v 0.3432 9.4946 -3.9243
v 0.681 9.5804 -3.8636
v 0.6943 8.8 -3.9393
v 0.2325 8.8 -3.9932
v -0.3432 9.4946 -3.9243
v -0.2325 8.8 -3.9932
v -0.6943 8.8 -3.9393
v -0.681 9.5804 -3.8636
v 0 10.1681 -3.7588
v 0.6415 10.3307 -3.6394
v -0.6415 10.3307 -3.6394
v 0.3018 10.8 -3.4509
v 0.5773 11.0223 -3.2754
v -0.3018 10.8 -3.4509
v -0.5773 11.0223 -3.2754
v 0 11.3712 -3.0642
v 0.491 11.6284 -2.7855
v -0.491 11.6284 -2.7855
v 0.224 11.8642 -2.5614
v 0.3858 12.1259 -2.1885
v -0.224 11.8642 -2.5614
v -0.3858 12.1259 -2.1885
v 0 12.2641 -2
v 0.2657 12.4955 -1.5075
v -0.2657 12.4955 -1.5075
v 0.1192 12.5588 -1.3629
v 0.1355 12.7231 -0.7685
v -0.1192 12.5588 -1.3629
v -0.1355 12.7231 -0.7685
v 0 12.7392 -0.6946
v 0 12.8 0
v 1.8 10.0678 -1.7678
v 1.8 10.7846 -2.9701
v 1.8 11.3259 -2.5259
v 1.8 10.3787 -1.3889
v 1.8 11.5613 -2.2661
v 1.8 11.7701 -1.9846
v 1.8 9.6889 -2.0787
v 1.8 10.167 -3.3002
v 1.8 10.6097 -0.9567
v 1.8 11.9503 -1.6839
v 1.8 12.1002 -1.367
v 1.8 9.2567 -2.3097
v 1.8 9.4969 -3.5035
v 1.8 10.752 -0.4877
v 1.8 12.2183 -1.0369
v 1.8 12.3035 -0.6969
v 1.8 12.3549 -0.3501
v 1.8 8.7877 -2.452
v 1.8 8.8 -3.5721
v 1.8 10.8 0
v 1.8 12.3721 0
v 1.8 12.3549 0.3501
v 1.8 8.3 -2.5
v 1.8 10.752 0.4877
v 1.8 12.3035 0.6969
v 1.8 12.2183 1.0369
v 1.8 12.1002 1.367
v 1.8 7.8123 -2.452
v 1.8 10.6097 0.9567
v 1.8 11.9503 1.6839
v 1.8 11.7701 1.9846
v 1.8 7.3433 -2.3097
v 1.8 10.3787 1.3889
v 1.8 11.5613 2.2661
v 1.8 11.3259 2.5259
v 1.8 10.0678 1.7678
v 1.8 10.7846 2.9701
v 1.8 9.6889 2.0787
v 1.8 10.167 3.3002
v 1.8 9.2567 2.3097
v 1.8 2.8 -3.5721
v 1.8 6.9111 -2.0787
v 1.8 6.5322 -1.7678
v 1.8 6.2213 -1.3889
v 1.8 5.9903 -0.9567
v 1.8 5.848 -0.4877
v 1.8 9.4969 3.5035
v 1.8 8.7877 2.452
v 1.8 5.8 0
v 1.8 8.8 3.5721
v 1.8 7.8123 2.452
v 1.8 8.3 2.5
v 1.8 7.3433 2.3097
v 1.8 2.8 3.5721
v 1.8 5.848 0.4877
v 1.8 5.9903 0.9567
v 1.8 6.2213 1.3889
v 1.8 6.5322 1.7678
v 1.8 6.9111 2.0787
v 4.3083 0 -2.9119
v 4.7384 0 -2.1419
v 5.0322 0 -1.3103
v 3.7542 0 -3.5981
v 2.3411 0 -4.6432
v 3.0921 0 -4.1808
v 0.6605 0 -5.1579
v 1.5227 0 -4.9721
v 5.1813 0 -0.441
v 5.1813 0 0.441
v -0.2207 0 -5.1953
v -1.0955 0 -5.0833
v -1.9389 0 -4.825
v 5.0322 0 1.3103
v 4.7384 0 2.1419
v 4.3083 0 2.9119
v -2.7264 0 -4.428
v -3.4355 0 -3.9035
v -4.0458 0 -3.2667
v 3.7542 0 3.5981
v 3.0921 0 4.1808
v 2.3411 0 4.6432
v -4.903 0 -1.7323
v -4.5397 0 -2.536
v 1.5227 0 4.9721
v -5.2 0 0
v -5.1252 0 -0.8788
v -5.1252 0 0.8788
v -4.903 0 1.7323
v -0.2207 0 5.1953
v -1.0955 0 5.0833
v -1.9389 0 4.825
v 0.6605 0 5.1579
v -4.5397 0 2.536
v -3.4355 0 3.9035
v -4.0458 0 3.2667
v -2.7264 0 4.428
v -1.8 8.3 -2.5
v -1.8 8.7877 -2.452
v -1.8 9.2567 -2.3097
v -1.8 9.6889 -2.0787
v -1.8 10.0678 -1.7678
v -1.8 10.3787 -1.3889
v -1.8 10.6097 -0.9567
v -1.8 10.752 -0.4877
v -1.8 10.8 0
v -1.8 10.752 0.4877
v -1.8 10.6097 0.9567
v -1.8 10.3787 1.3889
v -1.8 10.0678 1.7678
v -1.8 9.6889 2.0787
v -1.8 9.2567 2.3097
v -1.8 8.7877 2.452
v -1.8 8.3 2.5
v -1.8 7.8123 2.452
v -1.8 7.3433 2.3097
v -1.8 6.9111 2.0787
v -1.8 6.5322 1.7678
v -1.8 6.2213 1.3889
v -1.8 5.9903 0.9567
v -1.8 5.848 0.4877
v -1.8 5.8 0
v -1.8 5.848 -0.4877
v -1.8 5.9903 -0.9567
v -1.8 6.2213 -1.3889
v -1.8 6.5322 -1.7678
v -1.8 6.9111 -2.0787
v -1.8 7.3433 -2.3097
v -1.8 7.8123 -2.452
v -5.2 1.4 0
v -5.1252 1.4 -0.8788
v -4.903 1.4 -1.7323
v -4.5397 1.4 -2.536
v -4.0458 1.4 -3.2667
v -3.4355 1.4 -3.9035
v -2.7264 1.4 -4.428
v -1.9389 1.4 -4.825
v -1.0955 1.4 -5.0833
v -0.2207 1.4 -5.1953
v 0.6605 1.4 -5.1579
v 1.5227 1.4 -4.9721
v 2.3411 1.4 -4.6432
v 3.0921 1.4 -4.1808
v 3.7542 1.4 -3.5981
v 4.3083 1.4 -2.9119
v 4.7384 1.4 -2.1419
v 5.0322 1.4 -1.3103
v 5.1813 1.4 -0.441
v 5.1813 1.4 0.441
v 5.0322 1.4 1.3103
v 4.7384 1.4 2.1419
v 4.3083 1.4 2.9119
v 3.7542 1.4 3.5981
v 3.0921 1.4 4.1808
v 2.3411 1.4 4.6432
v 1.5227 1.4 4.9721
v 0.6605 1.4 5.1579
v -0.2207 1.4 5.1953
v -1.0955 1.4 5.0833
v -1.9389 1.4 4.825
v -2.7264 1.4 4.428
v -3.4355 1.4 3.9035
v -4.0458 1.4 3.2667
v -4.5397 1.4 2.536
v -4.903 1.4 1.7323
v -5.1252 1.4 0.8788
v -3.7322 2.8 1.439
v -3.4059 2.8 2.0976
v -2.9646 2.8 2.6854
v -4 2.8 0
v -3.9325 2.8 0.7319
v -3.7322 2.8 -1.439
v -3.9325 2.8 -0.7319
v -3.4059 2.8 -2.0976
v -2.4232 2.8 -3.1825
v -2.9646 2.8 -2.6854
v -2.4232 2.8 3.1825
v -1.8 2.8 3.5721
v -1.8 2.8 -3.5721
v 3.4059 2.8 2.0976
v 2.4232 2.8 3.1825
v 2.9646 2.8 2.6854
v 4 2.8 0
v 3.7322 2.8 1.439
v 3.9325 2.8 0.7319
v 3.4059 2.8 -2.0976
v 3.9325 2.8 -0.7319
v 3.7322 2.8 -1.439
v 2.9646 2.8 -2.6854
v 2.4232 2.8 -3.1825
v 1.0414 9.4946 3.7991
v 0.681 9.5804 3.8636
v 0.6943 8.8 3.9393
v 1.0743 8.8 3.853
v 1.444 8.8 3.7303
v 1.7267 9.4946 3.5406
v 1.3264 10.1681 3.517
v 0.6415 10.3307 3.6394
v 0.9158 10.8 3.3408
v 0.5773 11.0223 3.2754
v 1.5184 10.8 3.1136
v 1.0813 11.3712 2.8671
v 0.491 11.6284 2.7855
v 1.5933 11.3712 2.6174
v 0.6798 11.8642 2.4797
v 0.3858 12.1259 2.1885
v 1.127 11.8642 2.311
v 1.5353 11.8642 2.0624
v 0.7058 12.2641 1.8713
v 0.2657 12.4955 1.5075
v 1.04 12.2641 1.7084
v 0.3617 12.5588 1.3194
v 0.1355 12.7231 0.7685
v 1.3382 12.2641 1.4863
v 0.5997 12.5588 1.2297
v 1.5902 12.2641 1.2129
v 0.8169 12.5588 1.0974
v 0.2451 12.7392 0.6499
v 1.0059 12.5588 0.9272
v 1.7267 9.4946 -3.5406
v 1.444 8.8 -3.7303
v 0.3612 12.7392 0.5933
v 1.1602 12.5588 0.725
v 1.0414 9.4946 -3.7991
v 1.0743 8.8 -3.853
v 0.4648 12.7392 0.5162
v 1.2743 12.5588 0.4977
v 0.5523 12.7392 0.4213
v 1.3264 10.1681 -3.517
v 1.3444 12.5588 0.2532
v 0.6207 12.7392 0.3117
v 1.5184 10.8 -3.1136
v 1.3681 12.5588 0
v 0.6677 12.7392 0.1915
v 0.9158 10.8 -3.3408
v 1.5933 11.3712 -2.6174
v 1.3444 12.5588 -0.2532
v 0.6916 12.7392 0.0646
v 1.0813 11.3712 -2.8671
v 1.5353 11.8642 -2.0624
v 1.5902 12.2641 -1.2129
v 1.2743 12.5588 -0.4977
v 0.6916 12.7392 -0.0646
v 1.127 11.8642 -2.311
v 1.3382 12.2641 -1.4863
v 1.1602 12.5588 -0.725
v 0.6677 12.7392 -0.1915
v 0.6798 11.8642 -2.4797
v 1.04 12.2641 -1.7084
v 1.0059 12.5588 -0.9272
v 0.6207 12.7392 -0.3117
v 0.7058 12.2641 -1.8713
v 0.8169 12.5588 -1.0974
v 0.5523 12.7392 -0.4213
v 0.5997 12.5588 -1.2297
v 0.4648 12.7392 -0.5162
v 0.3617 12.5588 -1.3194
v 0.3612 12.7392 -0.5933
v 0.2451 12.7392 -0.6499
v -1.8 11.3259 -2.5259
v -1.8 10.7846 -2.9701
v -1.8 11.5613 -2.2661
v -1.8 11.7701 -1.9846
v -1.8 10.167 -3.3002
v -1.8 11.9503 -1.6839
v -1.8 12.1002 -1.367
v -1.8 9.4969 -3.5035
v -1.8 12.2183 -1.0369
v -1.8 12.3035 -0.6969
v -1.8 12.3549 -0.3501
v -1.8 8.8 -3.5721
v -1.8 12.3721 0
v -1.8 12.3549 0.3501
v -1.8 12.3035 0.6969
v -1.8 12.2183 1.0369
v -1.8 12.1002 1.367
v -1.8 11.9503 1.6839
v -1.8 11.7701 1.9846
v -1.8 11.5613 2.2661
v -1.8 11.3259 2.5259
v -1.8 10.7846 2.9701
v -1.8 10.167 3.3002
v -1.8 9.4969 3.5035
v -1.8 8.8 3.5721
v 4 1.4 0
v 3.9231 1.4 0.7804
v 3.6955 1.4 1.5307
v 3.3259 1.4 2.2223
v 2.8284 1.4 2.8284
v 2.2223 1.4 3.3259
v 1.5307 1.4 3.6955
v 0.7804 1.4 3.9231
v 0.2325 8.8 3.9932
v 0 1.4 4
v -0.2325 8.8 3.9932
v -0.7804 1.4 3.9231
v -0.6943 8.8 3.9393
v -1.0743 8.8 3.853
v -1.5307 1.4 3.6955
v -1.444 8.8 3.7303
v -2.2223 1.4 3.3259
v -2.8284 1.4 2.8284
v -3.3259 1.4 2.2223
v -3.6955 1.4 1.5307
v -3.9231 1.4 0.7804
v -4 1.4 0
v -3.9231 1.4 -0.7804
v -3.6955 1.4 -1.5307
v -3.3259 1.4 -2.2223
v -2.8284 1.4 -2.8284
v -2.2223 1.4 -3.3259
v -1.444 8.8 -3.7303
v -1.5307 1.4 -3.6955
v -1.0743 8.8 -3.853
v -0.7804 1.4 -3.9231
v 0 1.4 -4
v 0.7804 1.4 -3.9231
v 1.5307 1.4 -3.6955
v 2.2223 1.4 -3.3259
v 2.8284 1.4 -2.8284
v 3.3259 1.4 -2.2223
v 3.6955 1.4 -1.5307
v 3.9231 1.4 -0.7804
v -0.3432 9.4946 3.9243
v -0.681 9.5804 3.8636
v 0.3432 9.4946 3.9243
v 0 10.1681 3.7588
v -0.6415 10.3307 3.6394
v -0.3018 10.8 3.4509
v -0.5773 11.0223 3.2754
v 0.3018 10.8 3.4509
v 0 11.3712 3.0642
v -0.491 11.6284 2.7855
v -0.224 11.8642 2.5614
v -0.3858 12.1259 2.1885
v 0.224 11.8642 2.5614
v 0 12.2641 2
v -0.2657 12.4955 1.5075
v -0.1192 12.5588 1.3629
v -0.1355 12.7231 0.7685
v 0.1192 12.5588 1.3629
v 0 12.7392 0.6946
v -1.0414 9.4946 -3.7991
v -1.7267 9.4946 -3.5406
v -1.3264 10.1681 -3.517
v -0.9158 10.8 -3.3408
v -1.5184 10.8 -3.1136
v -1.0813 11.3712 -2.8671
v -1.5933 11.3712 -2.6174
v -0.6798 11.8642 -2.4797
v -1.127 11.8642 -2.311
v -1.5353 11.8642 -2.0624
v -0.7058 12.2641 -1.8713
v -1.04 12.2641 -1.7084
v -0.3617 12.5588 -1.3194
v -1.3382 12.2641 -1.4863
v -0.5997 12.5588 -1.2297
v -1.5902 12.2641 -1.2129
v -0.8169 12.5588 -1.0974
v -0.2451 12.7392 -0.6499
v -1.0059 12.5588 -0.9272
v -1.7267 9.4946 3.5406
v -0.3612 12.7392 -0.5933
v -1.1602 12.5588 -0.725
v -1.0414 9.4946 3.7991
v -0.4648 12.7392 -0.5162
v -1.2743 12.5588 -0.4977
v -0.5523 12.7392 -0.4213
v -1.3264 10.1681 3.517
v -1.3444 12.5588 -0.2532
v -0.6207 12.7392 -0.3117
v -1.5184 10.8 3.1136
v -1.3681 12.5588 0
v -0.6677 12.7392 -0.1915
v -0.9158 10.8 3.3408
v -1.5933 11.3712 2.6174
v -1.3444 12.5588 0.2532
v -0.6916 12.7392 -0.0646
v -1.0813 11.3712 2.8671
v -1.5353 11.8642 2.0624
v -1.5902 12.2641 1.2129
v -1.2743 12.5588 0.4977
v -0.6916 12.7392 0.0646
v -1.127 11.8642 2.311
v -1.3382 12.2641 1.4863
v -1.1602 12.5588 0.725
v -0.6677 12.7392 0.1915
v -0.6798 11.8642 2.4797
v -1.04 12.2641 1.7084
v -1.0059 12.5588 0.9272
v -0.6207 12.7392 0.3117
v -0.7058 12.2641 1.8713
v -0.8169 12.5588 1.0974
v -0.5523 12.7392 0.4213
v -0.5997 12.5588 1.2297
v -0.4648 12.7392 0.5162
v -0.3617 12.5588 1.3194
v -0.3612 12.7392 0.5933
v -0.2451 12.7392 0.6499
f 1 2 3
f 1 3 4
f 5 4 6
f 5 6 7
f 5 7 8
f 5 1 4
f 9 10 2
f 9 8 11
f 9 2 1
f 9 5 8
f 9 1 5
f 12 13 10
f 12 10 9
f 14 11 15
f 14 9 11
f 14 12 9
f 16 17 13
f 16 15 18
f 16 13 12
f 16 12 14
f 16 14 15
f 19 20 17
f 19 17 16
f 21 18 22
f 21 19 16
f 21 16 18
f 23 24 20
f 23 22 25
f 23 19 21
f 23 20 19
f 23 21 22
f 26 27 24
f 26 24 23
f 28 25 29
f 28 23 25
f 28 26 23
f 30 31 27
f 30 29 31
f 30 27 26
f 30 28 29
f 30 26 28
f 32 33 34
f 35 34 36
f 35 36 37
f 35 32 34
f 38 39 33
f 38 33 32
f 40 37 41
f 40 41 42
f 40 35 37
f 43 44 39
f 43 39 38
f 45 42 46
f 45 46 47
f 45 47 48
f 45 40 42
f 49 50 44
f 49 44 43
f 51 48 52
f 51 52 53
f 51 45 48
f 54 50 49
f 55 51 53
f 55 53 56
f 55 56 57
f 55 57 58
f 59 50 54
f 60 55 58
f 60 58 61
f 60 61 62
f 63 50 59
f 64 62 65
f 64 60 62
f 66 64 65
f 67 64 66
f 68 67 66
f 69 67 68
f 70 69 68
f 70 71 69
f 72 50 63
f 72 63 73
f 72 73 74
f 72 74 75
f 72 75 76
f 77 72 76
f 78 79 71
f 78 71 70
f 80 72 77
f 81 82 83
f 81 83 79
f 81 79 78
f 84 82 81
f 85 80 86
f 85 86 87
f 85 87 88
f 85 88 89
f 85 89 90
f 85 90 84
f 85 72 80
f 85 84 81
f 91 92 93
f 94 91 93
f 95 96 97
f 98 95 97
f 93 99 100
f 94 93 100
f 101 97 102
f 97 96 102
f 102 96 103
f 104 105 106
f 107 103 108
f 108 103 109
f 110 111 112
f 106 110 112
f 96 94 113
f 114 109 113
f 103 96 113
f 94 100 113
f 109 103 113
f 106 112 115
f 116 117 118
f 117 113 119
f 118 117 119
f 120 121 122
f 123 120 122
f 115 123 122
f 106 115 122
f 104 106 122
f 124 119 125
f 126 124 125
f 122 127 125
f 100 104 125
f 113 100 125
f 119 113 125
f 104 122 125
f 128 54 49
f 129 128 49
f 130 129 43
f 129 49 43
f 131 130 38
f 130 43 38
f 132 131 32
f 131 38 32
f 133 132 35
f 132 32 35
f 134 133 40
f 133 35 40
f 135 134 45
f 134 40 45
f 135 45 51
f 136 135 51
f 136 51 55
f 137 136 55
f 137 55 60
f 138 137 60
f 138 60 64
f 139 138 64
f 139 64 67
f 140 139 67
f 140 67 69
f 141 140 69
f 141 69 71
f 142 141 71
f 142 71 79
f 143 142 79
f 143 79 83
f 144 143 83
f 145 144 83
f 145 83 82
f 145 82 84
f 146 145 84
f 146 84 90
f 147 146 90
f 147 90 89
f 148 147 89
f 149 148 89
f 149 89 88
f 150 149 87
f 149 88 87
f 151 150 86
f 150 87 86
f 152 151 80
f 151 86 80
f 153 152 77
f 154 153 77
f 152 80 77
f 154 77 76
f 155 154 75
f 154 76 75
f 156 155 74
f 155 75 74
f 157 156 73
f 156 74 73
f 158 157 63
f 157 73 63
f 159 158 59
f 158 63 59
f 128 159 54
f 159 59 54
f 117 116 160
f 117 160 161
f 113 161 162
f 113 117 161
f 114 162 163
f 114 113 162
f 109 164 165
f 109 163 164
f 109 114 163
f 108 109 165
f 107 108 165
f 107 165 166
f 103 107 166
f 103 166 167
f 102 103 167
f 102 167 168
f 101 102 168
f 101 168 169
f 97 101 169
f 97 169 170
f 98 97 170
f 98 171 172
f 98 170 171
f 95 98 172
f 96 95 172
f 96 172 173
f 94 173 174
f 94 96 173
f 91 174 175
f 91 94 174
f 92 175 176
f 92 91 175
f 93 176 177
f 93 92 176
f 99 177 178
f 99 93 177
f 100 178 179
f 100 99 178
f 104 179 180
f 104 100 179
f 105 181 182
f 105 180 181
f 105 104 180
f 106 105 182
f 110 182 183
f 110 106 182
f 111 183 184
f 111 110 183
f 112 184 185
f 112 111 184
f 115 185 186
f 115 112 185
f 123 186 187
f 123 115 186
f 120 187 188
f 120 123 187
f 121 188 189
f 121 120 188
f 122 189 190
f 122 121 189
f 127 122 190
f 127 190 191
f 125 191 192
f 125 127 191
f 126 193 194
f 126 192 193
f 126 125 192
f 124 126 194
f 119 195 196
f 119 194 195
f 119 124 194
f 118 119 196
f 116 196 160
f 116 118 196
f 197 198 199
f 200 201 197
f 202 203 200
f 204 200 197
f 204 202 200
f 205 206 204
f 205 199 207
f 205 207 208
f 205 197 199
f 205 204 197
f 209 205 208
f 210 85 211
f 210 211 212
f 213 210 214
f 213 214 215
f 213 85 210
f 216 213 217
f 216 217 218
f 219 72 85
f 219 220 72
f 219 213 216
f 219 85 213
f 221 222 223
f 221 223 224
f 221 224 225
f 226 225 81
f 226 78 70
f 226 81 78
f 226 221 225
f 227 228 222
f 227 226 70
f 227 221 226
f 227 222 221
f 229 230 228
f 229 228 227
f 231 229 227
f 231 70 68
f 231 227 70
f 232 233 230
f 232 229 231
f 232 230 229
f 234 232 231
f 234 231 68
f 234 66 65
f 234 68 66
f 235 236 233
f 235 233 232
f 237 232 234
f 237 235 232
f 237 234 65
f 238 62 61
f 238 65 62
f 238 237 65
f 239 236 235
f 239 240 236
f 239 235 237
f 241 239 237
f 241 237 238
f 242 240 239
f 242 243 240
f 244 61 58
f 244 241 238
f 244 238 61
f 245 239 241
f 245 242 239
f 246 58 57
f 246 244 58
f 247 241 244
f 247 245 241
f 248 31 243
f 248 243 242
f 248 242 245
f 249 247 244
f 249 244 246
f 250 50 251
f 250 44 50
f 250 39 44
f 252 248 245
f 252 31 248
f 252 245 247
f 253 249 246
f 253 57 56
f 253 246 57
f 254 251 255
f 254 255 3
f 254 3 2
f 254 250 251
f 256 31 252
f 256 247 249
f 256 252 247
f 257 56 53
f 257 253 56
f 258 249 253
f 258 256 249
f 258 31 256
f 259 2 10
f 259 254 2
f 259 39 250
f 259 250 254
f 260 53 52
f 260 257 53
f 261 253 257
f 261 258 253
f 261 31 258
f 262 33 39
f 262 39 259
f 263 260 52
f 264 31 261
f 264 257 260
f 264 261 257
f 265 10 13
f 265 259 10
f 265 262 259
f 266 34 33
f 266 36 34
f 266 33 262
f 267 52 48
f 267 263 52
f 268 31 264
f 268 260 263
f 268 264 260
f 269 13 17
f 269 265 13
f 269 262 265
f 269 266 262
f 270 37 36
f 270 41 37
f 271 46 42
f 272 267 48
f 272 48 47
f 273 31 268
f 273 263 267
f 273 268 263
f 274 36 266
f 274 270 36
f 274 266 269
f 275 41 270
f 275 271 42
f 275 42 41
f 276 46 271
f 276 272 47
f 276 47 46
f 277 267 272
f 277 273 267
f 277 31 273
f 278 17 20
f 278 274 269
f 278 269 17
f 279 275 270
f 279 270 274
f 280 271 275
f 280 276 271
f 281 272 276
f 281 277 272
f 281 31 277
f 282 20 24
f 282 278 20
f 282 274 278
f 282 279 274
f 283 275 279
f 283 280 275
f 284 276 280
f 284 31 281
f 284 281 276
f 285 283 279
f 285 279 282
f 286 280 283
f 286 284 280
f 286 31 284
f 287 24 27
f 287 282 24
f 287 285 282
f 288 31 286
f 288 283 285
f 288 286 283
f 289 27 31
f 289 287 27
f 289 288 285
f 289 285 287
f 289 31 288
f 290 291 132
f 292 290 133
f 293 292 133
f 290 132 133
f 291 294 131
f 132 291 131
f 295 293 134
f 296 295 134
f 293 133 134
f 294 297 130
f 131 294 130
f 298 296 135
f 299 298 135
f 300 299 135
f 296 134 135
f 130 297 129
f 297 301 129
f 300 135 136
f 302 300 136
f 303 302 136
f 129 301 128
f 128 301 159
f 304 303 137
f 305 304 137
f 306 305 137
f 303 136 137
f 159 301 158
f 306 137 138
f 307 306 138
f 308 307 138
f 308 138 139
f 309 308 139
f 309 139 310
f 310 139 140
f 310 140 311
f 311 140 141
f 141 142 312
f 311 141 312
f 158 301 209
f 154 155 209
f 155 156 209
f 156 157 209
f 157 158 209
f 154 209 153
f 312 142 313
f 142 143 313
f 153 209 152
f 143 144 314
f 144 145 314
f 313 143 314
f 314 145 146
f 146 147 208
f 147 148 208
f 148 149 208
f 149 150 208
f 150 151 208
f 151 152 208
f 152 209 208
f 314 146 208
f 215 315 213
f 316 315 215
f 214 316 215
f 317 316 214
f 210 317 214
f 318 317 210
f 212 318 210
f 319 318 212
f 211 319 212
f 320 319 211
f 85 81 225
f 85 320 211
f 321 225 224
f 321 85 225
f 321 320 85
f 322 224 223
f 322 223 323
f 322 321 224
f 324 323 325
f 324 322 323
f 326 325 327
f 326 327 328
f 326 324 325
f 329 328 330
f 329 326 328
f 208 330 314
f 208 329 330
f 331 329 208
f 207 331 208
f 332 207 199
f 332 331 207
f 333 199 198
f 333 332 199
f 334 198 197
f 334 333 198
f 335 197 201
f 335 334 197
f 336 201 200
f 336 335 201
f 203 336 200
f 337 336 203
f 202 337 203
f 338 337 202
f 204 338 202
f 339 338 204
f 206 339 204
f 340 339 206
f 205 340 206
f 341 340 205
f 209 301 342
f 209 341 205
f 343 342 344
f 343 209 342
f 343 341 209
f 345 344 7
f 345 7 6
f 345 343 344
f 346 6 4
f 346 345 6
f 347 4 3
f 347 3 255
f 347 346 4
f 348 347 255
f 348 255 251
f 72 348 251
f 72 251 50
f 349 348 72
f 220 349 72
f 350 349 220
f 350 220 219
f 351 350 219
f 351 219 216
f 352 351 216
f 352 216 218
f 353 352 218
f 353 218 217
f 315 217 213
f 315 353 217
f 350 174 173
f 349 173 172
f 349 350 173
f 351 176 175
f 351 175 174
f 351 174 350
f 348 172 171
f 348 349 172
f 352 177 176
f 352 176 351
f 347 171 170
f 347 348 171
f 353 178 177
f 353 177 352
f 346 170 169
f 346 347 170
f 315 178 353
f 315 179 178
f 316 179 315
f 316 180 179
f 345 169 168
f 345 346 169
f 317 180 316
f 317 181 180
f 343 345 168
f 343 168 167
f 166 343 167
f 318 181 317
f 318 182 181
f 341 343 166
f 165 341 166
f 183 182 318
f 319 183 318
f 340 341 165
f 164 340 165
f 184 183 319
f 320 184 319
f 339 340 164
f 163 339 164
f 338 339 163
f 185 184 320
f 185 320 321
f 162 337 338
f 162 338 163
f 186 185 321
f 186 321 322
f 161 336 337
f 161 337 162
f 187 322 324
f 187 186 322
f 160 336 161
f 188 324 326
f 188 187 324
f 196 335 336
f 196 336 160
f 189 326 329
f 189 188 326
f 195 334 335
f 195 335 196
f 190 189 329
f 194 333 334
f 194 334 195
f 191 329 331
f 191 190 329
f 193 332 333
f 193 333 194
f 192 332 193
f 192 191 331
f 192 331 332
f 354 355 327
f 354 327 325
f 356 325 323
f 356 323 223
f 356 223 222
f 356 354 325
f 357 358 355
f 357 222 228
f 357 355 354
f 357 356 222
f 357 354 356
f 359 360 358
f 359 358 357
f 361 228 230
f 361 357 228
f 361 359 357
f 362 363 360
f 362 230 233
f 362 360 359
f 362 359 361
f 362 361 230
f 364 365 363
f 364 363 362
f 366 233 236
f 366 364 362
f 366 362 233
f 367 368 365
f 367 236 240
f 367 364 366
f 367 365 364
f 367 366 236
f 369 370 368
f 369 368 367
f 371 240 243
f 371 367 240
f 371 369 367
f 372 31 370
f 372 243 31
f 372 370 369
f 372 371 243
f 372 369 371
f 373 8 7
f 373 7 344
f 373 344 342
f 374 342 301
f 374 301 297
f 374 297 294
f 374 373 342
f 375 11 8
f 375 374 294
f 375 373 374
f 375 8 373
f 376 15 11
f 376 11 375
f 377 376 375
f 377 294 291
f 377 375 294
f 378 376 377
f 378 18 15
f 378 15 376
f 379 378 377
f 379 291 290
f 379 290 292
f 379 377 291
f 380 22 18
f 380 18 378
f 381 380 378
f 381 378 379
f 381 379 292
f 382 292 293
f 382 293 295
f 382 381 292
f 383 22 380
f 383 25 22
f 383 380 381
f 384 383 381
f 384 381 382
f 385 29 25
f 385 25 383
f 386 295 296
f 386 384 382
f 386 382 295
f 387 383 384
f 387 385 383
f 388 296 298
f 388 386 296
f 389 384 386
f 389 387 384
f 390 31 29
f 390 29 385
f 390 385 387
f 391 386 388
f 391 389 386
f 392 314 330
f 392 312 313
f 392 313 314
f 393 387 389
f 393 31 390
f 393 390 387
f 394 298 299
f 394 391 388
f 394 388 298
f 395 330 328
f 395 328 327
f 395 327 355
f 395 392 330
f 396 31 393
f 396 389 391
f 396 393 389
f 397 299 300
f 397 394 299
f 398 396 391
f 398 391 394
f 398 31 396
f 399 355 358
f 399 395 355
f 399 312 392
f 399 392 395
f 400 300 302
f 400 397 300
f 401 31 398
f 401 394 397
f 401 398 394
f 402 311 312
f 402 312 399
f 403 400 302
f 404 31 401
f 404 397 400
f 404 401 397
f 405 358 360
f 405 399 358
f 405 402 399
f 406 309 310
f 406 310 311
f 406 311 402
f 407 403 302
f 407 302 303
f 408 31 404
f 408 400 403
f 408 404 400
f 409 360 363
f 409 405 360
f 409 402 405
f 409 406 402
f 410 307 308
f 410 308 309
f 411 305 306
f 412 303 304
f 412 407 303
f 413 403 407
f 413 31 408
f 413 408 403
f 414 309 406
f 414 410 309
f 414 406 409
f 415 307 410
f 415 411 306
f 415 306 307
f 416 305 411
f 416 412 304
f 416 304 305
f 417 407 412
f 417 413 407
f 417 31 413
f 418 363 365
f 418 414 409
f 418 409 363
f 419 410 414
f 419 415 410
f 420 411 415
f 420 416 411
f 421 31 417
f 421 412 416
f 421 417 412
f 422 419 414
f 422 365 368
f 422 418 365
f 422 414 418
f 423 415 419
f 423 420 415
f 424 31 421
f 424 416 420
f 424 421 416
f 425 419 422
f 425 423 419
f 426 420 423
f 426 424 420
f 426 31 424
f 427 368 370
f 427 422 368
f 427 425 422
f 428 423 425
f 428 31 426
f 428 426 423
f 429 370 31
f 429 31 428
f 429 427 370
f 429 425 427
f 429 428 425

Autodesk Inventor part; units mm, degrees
ref_plane "YZ Plane" through (0, 0, 0) normal (1, 0, 0) x (0, 1, 0)
ref_plane "XZ Plane" through (0, 0, 0) normal (0, 1, 0) x (-1, 0, 0)
ref_plane "XY Plane" through (0, 0, 0) normal (0, 0, 1) x (1, 0, 0)
sketch "Sketch1" plane through (0, 0, 0) normal (0, 1, 0) x (-1, 0, 0)
  circle A0 centre (0, 0) radius 5.2
  dimension "d0" = 10.4
extrude "Extrusion1" add sketch "Sketch1" along normal blind 1.4
sketch "Sketch2" plane through (0, 1.4, 0) normal (0, 1, 0) x (1, 0, 0)
  circle A0 centre (0, 0) radius 5.2 projected
  circle A1 centre (0, 0) radius 4
  dimension "d3" = 8
extrude "Extrusion2" add sketch "Sketch2" along normal blind 1.4 contours A1
sketch "Sketch3" plane through (0, 2.8, 0) normal (0, 1, 0) x (1, 0, 0)
  circle A0 centre (0, 0) radius 4 projected
  line L0 (-1.8, 3.5721) -> (-1.8, -3.5721)
  line L1 (1.8, 3.5721) -> (1.8, -3.5721)
  arc A1 (-1.8, -3.5721) -> (1.8, -3.5721) centre (0, 0) ccw
  arc A2 (1.8, 3.5721) -> (-1.8, 3.5721) centre (0, 0) ccw
extrude "Extrusion3" add sketch "Sketch3" along normal blind 10 contours L1 A0 L0
sketch "Sketch4" plane through (1.8, 2.8, 3.5721) normal (1, 0, 0) x (0, 0, -1)
  line L0 (0, 10) -> (7.1442, 10) projected
  line L1 (0, 0) -> (0, 10) projected
  line L2 (3.5721, 10) -> (3.5721, 5.5)
  circle A0 centre (3.5721, 5.5) radius 2.5
  point P0 (3.5721, -2.8)
  dimension "d9" = 4.5
  dimension "d10" = 5
extrude "Extrusion4" cut sketch "Sketch4" against normal blind 10
fillet "Fillet1" radius 4 2 edges at (0, 12.8, 4) (0, 12.8, -4)
properties part number "pruzinauvhyt"
